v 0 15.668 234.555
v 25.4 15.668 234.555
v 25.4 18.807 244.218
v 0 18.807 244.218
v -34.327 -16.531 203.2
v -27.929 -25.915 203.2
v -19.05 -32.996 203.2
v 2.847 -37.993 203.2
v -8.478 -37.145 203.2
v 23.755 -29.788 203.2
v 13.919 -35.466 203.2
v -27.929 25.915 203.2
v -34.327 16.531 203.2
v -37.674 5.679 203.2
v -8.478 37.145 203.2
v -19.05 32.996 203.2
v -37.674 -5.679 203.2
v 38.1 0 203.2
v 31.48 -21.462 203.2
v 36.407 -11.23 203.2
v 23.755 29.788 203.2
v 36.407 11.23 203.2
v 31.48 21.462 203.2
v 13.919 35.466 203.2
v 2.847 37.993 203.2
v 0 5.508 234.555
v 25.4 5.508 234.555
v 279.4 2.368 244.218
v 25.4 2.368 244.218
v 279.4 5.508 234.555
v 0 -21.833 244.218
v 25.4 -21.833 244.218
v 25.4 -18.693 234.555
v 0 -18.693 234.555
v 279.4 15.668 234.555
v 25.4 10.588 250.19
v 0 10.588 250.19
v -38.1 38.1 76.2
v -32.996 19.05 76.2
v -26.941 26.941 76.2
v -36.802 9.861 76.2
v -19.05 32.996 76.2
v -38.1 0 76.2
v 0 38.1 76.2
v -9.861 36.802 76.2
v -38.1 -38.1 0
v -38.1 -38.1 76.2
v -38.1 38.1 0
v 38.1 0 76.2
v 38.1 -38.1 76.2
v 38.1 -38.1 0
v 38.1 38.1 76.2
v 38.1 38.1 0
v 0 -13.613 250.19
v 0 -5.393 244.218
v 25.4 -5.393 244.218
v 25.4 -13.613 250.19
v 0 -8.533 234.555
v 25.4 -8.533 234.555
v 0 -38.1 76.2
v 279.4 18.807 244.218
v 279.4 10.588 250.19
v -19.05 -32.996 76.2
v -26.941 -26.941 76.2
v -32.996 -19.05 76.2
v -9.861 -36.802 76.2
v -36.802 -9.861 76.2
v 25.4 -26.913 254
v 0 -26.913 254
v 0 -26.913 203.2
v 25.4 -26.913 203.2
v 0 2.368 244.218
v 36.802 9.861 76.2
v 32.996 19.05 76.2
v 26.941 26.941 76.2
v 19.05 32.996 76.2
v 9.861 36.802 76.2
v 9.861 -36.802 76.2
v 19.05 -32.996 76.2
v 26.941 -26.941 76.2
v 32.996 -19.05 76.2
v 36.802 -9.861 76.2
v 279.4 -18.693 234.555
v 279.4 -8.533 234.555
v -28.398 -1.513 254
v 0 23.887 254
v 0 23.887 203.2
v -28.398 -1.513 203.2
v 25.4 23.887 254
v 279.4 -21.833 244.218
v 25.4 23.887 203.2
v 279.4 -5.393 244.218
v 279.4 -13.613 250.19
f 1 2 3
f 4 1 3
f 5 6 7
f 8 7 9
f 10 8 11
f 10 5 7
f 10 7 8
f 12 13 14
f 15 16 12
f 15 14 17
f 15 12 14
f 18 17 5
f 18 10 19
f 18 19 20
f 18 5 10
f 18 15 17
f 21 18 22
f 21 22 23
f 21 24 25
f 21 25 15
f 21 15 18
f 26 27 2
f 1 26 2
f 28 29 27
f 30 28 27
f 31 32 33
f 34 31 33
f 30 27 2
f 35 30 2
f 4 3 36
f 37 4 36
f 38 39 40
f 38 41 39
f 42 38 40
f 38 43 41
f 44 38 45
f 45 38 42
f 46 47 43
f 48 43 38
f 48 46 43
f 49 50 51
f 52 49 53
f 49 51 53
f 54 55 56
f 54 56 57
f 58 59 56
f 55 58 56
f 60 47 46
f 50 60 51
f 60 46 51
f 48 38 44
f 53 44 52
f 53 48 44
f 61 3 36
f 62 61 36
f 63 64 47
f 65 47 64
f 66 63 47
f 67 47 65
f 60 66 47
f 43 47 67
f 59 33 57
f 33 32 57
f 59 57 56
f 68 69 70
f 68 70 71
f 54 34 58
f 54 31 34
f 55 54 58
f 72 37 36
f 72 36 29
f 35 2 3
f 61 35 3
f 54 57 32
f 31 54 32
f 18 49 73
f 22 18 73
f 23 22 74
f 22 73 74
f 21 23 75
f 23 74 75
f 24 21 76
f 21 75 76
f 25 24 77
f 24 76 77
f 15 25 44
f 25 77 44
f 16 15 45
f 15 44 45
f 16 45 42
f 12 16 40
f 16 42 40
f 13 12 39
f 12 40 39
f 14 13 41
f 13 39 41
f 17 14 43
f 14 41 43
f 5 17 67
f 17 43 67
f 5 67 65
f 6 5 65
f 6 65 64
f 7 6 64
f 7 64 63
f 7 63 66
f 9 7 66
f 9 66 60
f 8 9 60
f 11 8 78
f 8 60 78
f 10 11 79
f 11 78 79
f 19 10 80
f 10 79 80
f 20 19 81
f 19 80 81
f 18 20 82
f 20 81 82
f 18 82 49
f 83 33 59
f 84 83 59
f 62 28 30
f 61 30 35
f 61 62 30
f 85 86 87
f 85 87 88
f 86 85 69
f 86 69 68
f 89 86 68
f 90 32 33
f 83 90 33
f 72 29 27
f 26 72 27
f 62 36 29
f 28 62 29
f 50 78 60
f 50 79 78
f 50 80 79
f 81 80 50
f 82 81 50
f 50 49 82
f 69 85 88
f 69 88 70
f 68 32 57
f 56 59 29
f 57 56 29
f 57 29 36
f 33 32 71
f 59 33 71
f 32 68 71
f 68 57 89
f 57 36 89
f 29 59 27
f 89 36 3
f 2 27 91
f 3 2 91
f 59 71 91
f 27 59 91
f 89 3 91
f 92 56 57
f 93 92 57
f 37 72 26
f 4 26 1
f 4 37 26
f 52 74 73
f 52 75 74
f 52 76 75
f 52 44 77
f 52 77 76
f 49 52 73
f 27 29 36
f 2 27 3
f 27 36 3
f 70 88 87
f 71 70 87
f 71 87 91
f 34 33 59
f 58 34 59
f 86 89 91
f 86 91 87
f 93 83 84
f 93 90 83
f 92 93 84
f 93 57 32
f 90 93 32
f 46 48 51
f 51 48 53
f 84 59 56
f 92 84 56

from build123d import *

# Parameters (mm, degrees)
F0_W     = 76.2
F0_H     = 76.2
F1_DEPTH = 76.2
F2_R     = 38.1
F3_DEPTH = 127
F5_DEPTH = 50.8
F7_DEPTH = 25.4
F8_DEPTH = 254


with BuildPart() as f1:
    # F0 (on Top) → F1 (new body)
    with BuildSketch(Plane.XY):
        Rectangle(F0_W, F0_H)
    extrude(amount=F1_DEPTH)

    # F2 (on face) → F3 (join)
    with BuildSketch(Plane.XY.offset(76.2)):
        Circle(F2_R)
    extrude(amount=F3_DEPTH)


with BuildPart() as f5:
    # F4 (on face) → F5 (new body)
    with BuildSketch(Plane.XY.offset(203.2)):
        Polygon((25.4, 23.887334), (0, 23.887334), (-28.398063, -1.512666), (0, -26.912666), (25.4, -26.912666), align=None)
    extrude(amount=F5_DEPTH)

    # F6 (on face) → F7 (cut)
    with BuildSketch(Plane.YZ.offset(25.4)):
        Polygon((-18.693053, 234.555368), (-8.533053, 234.555368), (-5.39344, 244.218102), (-13.613053, 250.19), (-21.832666, 244.218102), align=None)
        Polygon((5.507722, 234.555368), (15.667722, 234.555368), (18.807334, 244.218102), (10.587722, 250.19), (2.368109, 244.218102), align=None)
    extrude(amount=-F7_DEPTH, mode=Mode.SUBTRACT)


with BuildPart() as f8:
    # F6 (on face) → F8 (new body)
    with BuildSketch(Plane.YZ.offset(25.4)):
        Polygon((-18.693053, 234.555368), (-8.533053, 234.555368), (-5.39344, 244.218102), (-13.613053, 250.19), (-21.832666, 244.218102), align=None)
        Polygon((5.507722, 234.555368), (15.667722, 234.555368), (18.807334, 244.218102), (10.587722, 250.19), (2.368109, 244.218102), align=None)
    extrude(amount=F8_DEPTH)


solid = Compound([f1.part, f5.part, f8.part])
